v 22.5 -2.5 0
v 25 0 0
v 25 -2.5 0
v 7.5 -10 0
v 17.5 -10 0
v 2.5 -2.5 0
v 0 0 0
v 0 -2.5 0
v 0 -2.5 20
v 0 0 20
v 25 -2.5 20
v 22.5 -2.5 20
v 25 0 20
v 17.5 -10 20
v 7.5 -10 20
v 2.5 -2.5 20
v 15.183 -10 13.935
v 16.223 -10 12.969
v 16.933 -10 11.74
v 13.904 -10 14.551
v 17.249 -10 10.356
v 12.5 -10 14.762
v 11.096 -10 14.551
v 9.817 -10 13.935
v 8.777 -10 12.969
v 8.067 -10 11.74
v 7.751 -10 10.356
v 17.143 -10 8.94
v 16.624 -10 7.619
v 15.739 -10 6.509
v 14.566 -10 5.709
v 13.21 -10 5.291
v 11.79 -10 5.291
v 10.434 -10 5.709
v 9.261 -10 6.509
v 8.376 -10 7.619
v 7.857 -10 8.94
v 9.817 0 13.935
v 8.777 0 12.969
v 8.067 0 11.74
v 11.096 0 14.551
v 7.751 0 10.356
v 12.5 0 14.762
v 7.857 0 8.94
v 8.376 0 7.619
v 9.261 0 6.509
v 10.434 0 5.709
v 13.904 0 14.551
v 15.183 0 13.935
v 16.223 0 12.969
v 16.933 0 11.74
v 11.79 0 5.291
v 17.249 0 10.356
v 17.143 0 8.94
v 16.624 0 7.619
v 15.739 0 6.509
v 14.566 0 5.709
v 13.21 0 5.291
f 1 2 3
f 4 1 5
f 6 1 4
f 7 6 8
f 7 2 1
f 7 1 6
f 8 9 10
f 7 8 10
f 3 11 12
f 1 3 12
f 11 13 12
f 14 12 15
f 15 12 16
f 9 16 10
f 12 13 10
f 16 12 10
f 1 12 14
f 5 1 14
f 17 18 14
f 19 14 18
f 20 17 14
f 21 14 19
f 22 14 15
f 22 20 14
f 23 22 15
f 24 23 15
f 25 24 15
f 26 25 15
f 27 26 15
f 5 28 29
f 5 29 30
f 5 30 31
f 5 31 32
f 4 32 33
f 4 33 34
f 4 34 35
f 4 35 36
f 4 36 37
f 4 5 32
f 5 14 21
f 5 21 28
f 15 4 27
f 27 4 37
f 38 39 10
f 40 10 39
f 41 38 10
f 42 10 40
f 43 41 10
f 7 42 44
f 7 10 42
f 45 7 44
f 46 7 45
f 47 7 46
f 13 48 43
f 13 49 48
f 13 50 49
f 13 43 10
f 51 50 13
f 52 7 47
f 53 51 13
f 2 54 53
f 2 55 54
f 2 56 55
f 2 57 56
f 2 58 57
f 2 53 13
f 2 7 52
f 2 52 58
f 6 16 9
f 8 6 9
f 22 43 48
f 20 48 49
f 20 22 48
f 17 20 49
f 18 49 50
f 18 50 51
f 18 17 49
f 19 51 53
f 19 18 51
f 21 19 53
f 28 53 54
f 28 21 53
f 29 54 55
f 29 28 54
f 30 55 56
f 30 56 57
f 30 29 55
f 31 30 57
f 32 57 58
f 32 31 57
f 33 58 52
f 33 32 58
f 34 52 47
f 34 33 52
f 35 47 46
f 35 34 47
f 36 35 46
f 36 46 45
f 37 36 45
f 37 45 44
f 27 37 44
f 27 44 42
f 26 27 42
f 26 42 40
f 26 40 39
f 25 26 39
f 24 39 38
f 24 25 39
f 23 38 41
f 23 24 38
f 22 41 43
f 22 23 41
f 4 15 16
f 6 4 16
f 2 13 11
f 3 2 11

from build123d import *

# Parameters (mm, degrees)
SALIENTE_EXTRUIR1_DEPTH = 20
CORTAR_EXTRUIR1_START   = -10
CROQUIS2_R              = 4.7625
CORTAR_EXTRUIR1_DEPTH   = 10


with BuildPart() as part:
    # Croquis1 → Saliente-Extruir1 (new body)
    with BuildSketch(Plane.XY):
        Polygon((0, 0), (25, 0), (25, -2.5), (22.5, -2.5), (17.5, -10), (7.5, -10), (2.5, -2.5), (0, -2.5), align=None)
    extrude(amount=SALIENTE_EXTRUIR1_DEPTH)

    # Croquis2 → Cortar-Extruir1 (cut)
    with BuildSketch(Plane(origin=(0, 0, 0), x_dir=(1, 0, 0), z_dir=(0, 1, 0)).offset(CORTAR_EXTRUIR1_START)):
        with Locations(Location((12.5, -10, 0), (0, 0, 270))):
            Circle(CROQUIS2_R)
    extrude(amount=CORTAR_EXTRUIR1_DEPTH, mode=Mode.SUBTRACT)


solid = part.part
